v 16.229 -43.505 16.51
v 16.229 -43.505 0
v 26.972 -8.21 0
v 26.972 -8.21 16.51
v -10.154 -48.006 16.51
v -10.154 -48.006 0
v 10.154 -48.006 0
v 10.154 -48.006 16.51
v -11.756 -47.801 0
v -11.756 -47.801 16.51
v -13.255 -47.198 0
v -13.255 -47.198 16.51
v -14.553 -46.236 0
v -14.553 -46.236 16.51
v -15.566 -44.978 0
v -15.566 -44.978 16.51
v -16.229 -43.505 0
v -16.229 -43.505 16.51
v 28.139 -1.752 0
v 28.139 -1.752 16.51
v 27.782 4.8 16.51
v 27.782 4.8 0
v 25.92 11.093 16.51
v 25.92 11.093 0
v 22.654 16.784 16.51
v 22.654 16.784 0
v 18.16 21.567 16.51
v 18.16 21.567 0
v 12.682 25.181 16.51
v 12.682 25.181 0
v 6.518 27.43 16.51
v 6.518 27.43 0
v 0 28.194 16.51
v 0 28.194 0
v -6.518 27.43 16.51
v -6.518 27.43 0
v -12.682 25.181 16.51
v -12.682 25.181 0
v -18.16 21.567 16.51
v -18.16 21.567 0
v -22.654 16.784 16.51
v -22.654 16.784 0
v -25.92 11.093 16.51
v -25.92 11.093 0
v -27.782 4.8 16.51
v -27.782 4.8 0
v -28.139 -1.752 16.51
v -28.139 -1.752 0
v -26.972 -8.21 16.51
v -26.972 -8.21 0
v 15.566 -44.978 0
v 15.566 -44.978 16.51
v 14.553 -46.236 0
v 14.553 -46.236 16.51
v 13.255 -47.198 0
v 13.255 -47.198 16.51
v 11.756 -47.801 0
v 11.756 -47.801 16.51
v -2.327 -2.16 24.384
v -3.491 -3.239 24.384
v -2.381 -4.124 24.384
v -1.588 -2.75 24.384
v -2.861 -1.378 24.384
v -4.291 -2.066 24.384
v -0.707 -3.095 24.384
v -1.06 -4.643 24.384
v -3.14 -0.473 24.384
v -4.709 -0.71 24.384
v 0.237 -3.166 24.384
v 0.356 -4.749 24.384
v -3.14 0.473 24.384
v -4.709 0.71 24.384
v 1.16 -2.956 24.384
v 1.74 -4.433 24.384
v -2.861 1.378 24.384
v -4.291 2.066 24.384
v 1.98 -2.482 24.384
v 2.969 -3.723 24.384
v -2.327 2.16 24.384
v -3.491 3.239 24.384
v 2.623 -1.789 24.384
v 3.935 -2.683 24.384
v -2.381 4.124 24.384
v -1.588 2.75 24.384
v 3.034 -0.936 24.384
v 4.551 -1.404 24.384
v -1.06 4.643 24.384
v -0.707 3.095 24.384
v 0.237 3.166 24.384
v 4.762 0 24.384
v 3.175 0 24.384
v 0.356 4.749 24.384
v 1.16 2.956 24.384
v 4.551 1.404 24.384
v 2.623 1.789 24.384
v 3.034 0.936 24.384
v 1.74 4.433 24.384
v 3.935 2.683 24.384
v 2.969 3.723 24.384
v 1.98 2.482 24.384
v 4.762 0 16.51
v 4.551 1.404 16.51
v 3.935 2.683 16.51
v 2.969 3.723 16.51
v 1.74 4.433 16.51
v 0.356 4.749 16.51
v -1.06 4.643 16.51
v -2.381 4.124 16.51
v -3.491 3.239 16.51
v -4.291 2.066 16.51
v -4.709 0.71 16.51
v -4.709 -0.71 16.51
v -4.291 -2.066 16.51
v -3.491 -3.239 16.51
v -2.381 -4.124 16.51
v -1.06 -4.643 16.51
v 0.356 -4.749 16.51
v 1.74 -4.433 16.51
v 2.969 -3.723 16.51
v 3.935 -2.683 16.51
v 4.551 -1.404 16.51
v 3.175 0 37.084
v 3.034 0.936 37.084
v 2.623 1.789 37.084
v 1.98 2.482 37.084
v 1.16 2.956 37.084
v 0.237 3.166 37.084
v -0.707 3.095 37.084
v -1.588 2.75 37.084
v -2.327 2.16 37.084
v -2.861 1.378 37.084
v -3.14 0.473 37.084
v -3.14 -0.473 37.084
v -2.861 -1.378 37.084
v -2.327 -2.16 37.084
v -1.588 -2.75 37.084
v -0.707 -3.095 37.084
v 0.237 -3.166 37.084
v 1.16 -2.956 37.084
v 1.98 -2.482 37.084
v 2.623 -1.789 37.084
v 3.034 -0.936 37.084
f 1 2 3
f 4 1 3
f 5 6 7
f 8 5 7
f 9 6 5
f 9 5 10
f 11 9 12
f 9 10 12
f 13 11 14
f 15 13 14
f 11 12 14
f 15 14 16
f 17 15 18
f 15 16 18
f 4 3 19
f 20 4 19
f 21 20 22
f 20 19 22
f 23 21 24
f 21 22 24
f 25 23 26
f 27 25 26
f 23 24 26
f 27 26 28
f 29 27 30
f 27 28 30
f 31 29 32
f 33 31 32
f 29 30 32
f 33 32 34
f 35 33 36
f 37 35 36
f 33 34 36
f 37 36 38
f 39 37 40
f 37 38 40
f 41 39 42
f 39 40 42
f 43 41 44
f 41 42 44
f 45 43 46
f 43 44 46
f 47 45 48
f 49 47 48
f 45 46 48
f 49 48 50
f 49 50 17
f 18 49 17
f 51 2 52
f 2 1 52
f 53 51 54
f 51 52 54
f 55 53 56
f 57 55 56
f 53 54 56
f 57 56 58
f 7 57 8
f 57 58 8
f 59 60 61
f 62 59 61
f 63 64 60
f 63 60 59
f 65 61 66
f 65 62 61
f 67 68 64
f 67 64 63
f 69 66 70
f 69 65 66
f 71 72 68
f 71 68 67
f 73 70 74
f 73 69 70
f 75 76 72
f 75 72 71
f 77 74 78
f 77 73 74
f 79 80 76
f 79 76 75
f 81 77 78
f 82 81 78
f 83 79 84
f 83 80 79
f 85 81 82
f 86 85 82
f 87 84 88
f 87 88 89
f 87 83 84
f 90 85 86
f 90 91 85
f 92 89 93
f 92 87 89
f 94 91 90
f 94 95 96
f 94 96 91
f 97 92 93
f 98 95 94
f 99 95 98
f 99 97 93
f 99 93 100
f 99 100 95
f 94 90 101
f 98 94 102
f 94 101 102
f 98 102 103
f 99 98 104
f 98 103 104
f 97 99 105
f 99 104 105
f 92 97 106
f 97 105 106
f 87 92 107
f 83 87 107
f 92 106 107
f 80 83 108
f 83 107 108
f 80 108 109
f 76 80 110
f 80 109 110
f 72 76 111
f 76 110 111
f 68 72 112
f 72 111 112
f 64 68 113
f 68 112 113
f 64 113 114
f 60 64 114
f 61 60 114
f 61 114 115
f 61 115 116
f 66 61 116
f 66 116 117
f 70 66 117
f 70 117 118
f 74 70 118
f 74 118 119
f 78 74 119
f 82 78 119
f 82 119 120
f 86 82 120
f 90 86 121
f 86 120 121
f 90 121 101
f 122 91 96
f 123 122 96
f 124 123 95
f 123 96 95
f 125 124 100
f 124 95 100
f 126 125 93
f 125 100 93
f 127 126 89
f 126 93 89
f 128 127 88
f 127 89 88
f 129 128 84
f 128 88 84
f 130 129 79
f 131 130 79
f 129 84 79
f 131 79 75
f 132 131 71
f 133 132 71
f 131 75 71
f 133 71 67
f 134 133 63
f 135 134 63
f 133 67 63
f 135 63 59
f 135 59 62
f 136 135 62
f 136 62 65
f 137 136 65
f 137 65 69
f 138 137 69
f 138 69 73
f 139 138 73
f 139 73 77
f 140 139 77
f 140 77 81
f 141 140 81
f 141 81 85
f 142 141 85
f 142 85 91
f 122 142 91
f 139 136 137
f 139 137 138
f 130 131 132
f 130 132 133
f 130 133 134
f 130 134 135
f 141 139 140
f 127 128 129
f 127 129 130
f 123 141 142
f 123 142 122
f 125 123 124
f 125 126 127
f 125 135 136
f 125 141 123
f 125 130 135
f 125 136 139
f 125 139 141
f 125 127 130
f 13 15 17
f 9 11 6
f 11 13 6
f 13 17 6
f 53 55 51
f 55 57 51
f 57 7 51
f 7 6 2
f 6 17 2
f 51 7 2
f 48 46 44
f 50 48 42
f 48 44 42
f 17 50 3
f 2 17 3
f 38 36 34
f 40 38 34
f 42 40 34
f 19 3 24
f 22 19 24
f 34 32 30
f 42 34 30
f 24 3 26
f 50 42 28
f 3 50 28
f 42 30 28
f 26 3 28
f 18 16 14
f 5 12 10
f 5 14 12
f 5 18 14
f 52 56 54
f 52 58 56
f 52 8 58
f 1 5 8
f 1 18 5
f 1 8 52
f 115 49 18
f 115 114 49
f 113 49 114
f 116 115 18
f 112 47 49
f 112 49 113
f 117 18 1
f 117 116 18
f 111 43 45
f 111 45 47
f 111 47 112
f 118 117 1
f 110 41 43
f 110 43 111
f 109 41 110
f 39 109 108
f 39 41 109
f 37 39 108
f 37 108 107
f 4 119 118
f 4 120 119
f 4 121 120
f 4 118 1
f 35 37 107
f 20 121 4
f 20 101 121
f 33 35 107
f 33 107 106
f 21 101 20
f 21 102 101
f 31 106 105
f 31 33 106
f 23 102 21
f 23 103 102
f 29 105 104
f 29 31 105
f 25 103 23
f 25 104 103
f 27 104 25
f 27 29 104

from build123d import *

# Parameters (mm, degrees)
F1_DEPTH = 16.51
F2_R     = 3.175
F3_DEPTH = 20.574
F4_R     = 4.7625
F5_DEPTH = 7.874
F6_R     = 6.35


with BuildPart() as f1:
    # F0 (on Top) → F1 (new body)
    with BuildSketch(Plane.XY):
        with BuildLine():
            Line((14.859, -48.006), (26.972211, -8.209839))
            ThreePointArc((26.972211, -8.209839), (0, 28.194), (-26.972211, -8.209839))
            Line((-26.972211, -8.209839), (-14.859, -48.006))
            Line((-14.859, -48.006), (14.859, -48.006))
        make_face()
    extrude(amount=F1_DEPTH)

    # F2 (on face) → F3 (join)
    with BuildSketch(Plane.XY.offset(16.51)):
        Circle(F2_R)
    extrude(amount=F3_DEPTH)

    # F4 (on face) → F5 (join)
    with BuildSketch(Plane.XY.offset(16.51)):
        Circle(F4_R)
    extrude(amount=F5_DEPTH)

    # F6
    f6_edges = [f1.edges().sort_by_distance(p)[0] for p in [
        (-14.859, -48.006, 8.255),
        (14.859, -48.006, 8.255),
    ]]
    fillet(f6_edges, radius=F6_R)


solid = f1.part
